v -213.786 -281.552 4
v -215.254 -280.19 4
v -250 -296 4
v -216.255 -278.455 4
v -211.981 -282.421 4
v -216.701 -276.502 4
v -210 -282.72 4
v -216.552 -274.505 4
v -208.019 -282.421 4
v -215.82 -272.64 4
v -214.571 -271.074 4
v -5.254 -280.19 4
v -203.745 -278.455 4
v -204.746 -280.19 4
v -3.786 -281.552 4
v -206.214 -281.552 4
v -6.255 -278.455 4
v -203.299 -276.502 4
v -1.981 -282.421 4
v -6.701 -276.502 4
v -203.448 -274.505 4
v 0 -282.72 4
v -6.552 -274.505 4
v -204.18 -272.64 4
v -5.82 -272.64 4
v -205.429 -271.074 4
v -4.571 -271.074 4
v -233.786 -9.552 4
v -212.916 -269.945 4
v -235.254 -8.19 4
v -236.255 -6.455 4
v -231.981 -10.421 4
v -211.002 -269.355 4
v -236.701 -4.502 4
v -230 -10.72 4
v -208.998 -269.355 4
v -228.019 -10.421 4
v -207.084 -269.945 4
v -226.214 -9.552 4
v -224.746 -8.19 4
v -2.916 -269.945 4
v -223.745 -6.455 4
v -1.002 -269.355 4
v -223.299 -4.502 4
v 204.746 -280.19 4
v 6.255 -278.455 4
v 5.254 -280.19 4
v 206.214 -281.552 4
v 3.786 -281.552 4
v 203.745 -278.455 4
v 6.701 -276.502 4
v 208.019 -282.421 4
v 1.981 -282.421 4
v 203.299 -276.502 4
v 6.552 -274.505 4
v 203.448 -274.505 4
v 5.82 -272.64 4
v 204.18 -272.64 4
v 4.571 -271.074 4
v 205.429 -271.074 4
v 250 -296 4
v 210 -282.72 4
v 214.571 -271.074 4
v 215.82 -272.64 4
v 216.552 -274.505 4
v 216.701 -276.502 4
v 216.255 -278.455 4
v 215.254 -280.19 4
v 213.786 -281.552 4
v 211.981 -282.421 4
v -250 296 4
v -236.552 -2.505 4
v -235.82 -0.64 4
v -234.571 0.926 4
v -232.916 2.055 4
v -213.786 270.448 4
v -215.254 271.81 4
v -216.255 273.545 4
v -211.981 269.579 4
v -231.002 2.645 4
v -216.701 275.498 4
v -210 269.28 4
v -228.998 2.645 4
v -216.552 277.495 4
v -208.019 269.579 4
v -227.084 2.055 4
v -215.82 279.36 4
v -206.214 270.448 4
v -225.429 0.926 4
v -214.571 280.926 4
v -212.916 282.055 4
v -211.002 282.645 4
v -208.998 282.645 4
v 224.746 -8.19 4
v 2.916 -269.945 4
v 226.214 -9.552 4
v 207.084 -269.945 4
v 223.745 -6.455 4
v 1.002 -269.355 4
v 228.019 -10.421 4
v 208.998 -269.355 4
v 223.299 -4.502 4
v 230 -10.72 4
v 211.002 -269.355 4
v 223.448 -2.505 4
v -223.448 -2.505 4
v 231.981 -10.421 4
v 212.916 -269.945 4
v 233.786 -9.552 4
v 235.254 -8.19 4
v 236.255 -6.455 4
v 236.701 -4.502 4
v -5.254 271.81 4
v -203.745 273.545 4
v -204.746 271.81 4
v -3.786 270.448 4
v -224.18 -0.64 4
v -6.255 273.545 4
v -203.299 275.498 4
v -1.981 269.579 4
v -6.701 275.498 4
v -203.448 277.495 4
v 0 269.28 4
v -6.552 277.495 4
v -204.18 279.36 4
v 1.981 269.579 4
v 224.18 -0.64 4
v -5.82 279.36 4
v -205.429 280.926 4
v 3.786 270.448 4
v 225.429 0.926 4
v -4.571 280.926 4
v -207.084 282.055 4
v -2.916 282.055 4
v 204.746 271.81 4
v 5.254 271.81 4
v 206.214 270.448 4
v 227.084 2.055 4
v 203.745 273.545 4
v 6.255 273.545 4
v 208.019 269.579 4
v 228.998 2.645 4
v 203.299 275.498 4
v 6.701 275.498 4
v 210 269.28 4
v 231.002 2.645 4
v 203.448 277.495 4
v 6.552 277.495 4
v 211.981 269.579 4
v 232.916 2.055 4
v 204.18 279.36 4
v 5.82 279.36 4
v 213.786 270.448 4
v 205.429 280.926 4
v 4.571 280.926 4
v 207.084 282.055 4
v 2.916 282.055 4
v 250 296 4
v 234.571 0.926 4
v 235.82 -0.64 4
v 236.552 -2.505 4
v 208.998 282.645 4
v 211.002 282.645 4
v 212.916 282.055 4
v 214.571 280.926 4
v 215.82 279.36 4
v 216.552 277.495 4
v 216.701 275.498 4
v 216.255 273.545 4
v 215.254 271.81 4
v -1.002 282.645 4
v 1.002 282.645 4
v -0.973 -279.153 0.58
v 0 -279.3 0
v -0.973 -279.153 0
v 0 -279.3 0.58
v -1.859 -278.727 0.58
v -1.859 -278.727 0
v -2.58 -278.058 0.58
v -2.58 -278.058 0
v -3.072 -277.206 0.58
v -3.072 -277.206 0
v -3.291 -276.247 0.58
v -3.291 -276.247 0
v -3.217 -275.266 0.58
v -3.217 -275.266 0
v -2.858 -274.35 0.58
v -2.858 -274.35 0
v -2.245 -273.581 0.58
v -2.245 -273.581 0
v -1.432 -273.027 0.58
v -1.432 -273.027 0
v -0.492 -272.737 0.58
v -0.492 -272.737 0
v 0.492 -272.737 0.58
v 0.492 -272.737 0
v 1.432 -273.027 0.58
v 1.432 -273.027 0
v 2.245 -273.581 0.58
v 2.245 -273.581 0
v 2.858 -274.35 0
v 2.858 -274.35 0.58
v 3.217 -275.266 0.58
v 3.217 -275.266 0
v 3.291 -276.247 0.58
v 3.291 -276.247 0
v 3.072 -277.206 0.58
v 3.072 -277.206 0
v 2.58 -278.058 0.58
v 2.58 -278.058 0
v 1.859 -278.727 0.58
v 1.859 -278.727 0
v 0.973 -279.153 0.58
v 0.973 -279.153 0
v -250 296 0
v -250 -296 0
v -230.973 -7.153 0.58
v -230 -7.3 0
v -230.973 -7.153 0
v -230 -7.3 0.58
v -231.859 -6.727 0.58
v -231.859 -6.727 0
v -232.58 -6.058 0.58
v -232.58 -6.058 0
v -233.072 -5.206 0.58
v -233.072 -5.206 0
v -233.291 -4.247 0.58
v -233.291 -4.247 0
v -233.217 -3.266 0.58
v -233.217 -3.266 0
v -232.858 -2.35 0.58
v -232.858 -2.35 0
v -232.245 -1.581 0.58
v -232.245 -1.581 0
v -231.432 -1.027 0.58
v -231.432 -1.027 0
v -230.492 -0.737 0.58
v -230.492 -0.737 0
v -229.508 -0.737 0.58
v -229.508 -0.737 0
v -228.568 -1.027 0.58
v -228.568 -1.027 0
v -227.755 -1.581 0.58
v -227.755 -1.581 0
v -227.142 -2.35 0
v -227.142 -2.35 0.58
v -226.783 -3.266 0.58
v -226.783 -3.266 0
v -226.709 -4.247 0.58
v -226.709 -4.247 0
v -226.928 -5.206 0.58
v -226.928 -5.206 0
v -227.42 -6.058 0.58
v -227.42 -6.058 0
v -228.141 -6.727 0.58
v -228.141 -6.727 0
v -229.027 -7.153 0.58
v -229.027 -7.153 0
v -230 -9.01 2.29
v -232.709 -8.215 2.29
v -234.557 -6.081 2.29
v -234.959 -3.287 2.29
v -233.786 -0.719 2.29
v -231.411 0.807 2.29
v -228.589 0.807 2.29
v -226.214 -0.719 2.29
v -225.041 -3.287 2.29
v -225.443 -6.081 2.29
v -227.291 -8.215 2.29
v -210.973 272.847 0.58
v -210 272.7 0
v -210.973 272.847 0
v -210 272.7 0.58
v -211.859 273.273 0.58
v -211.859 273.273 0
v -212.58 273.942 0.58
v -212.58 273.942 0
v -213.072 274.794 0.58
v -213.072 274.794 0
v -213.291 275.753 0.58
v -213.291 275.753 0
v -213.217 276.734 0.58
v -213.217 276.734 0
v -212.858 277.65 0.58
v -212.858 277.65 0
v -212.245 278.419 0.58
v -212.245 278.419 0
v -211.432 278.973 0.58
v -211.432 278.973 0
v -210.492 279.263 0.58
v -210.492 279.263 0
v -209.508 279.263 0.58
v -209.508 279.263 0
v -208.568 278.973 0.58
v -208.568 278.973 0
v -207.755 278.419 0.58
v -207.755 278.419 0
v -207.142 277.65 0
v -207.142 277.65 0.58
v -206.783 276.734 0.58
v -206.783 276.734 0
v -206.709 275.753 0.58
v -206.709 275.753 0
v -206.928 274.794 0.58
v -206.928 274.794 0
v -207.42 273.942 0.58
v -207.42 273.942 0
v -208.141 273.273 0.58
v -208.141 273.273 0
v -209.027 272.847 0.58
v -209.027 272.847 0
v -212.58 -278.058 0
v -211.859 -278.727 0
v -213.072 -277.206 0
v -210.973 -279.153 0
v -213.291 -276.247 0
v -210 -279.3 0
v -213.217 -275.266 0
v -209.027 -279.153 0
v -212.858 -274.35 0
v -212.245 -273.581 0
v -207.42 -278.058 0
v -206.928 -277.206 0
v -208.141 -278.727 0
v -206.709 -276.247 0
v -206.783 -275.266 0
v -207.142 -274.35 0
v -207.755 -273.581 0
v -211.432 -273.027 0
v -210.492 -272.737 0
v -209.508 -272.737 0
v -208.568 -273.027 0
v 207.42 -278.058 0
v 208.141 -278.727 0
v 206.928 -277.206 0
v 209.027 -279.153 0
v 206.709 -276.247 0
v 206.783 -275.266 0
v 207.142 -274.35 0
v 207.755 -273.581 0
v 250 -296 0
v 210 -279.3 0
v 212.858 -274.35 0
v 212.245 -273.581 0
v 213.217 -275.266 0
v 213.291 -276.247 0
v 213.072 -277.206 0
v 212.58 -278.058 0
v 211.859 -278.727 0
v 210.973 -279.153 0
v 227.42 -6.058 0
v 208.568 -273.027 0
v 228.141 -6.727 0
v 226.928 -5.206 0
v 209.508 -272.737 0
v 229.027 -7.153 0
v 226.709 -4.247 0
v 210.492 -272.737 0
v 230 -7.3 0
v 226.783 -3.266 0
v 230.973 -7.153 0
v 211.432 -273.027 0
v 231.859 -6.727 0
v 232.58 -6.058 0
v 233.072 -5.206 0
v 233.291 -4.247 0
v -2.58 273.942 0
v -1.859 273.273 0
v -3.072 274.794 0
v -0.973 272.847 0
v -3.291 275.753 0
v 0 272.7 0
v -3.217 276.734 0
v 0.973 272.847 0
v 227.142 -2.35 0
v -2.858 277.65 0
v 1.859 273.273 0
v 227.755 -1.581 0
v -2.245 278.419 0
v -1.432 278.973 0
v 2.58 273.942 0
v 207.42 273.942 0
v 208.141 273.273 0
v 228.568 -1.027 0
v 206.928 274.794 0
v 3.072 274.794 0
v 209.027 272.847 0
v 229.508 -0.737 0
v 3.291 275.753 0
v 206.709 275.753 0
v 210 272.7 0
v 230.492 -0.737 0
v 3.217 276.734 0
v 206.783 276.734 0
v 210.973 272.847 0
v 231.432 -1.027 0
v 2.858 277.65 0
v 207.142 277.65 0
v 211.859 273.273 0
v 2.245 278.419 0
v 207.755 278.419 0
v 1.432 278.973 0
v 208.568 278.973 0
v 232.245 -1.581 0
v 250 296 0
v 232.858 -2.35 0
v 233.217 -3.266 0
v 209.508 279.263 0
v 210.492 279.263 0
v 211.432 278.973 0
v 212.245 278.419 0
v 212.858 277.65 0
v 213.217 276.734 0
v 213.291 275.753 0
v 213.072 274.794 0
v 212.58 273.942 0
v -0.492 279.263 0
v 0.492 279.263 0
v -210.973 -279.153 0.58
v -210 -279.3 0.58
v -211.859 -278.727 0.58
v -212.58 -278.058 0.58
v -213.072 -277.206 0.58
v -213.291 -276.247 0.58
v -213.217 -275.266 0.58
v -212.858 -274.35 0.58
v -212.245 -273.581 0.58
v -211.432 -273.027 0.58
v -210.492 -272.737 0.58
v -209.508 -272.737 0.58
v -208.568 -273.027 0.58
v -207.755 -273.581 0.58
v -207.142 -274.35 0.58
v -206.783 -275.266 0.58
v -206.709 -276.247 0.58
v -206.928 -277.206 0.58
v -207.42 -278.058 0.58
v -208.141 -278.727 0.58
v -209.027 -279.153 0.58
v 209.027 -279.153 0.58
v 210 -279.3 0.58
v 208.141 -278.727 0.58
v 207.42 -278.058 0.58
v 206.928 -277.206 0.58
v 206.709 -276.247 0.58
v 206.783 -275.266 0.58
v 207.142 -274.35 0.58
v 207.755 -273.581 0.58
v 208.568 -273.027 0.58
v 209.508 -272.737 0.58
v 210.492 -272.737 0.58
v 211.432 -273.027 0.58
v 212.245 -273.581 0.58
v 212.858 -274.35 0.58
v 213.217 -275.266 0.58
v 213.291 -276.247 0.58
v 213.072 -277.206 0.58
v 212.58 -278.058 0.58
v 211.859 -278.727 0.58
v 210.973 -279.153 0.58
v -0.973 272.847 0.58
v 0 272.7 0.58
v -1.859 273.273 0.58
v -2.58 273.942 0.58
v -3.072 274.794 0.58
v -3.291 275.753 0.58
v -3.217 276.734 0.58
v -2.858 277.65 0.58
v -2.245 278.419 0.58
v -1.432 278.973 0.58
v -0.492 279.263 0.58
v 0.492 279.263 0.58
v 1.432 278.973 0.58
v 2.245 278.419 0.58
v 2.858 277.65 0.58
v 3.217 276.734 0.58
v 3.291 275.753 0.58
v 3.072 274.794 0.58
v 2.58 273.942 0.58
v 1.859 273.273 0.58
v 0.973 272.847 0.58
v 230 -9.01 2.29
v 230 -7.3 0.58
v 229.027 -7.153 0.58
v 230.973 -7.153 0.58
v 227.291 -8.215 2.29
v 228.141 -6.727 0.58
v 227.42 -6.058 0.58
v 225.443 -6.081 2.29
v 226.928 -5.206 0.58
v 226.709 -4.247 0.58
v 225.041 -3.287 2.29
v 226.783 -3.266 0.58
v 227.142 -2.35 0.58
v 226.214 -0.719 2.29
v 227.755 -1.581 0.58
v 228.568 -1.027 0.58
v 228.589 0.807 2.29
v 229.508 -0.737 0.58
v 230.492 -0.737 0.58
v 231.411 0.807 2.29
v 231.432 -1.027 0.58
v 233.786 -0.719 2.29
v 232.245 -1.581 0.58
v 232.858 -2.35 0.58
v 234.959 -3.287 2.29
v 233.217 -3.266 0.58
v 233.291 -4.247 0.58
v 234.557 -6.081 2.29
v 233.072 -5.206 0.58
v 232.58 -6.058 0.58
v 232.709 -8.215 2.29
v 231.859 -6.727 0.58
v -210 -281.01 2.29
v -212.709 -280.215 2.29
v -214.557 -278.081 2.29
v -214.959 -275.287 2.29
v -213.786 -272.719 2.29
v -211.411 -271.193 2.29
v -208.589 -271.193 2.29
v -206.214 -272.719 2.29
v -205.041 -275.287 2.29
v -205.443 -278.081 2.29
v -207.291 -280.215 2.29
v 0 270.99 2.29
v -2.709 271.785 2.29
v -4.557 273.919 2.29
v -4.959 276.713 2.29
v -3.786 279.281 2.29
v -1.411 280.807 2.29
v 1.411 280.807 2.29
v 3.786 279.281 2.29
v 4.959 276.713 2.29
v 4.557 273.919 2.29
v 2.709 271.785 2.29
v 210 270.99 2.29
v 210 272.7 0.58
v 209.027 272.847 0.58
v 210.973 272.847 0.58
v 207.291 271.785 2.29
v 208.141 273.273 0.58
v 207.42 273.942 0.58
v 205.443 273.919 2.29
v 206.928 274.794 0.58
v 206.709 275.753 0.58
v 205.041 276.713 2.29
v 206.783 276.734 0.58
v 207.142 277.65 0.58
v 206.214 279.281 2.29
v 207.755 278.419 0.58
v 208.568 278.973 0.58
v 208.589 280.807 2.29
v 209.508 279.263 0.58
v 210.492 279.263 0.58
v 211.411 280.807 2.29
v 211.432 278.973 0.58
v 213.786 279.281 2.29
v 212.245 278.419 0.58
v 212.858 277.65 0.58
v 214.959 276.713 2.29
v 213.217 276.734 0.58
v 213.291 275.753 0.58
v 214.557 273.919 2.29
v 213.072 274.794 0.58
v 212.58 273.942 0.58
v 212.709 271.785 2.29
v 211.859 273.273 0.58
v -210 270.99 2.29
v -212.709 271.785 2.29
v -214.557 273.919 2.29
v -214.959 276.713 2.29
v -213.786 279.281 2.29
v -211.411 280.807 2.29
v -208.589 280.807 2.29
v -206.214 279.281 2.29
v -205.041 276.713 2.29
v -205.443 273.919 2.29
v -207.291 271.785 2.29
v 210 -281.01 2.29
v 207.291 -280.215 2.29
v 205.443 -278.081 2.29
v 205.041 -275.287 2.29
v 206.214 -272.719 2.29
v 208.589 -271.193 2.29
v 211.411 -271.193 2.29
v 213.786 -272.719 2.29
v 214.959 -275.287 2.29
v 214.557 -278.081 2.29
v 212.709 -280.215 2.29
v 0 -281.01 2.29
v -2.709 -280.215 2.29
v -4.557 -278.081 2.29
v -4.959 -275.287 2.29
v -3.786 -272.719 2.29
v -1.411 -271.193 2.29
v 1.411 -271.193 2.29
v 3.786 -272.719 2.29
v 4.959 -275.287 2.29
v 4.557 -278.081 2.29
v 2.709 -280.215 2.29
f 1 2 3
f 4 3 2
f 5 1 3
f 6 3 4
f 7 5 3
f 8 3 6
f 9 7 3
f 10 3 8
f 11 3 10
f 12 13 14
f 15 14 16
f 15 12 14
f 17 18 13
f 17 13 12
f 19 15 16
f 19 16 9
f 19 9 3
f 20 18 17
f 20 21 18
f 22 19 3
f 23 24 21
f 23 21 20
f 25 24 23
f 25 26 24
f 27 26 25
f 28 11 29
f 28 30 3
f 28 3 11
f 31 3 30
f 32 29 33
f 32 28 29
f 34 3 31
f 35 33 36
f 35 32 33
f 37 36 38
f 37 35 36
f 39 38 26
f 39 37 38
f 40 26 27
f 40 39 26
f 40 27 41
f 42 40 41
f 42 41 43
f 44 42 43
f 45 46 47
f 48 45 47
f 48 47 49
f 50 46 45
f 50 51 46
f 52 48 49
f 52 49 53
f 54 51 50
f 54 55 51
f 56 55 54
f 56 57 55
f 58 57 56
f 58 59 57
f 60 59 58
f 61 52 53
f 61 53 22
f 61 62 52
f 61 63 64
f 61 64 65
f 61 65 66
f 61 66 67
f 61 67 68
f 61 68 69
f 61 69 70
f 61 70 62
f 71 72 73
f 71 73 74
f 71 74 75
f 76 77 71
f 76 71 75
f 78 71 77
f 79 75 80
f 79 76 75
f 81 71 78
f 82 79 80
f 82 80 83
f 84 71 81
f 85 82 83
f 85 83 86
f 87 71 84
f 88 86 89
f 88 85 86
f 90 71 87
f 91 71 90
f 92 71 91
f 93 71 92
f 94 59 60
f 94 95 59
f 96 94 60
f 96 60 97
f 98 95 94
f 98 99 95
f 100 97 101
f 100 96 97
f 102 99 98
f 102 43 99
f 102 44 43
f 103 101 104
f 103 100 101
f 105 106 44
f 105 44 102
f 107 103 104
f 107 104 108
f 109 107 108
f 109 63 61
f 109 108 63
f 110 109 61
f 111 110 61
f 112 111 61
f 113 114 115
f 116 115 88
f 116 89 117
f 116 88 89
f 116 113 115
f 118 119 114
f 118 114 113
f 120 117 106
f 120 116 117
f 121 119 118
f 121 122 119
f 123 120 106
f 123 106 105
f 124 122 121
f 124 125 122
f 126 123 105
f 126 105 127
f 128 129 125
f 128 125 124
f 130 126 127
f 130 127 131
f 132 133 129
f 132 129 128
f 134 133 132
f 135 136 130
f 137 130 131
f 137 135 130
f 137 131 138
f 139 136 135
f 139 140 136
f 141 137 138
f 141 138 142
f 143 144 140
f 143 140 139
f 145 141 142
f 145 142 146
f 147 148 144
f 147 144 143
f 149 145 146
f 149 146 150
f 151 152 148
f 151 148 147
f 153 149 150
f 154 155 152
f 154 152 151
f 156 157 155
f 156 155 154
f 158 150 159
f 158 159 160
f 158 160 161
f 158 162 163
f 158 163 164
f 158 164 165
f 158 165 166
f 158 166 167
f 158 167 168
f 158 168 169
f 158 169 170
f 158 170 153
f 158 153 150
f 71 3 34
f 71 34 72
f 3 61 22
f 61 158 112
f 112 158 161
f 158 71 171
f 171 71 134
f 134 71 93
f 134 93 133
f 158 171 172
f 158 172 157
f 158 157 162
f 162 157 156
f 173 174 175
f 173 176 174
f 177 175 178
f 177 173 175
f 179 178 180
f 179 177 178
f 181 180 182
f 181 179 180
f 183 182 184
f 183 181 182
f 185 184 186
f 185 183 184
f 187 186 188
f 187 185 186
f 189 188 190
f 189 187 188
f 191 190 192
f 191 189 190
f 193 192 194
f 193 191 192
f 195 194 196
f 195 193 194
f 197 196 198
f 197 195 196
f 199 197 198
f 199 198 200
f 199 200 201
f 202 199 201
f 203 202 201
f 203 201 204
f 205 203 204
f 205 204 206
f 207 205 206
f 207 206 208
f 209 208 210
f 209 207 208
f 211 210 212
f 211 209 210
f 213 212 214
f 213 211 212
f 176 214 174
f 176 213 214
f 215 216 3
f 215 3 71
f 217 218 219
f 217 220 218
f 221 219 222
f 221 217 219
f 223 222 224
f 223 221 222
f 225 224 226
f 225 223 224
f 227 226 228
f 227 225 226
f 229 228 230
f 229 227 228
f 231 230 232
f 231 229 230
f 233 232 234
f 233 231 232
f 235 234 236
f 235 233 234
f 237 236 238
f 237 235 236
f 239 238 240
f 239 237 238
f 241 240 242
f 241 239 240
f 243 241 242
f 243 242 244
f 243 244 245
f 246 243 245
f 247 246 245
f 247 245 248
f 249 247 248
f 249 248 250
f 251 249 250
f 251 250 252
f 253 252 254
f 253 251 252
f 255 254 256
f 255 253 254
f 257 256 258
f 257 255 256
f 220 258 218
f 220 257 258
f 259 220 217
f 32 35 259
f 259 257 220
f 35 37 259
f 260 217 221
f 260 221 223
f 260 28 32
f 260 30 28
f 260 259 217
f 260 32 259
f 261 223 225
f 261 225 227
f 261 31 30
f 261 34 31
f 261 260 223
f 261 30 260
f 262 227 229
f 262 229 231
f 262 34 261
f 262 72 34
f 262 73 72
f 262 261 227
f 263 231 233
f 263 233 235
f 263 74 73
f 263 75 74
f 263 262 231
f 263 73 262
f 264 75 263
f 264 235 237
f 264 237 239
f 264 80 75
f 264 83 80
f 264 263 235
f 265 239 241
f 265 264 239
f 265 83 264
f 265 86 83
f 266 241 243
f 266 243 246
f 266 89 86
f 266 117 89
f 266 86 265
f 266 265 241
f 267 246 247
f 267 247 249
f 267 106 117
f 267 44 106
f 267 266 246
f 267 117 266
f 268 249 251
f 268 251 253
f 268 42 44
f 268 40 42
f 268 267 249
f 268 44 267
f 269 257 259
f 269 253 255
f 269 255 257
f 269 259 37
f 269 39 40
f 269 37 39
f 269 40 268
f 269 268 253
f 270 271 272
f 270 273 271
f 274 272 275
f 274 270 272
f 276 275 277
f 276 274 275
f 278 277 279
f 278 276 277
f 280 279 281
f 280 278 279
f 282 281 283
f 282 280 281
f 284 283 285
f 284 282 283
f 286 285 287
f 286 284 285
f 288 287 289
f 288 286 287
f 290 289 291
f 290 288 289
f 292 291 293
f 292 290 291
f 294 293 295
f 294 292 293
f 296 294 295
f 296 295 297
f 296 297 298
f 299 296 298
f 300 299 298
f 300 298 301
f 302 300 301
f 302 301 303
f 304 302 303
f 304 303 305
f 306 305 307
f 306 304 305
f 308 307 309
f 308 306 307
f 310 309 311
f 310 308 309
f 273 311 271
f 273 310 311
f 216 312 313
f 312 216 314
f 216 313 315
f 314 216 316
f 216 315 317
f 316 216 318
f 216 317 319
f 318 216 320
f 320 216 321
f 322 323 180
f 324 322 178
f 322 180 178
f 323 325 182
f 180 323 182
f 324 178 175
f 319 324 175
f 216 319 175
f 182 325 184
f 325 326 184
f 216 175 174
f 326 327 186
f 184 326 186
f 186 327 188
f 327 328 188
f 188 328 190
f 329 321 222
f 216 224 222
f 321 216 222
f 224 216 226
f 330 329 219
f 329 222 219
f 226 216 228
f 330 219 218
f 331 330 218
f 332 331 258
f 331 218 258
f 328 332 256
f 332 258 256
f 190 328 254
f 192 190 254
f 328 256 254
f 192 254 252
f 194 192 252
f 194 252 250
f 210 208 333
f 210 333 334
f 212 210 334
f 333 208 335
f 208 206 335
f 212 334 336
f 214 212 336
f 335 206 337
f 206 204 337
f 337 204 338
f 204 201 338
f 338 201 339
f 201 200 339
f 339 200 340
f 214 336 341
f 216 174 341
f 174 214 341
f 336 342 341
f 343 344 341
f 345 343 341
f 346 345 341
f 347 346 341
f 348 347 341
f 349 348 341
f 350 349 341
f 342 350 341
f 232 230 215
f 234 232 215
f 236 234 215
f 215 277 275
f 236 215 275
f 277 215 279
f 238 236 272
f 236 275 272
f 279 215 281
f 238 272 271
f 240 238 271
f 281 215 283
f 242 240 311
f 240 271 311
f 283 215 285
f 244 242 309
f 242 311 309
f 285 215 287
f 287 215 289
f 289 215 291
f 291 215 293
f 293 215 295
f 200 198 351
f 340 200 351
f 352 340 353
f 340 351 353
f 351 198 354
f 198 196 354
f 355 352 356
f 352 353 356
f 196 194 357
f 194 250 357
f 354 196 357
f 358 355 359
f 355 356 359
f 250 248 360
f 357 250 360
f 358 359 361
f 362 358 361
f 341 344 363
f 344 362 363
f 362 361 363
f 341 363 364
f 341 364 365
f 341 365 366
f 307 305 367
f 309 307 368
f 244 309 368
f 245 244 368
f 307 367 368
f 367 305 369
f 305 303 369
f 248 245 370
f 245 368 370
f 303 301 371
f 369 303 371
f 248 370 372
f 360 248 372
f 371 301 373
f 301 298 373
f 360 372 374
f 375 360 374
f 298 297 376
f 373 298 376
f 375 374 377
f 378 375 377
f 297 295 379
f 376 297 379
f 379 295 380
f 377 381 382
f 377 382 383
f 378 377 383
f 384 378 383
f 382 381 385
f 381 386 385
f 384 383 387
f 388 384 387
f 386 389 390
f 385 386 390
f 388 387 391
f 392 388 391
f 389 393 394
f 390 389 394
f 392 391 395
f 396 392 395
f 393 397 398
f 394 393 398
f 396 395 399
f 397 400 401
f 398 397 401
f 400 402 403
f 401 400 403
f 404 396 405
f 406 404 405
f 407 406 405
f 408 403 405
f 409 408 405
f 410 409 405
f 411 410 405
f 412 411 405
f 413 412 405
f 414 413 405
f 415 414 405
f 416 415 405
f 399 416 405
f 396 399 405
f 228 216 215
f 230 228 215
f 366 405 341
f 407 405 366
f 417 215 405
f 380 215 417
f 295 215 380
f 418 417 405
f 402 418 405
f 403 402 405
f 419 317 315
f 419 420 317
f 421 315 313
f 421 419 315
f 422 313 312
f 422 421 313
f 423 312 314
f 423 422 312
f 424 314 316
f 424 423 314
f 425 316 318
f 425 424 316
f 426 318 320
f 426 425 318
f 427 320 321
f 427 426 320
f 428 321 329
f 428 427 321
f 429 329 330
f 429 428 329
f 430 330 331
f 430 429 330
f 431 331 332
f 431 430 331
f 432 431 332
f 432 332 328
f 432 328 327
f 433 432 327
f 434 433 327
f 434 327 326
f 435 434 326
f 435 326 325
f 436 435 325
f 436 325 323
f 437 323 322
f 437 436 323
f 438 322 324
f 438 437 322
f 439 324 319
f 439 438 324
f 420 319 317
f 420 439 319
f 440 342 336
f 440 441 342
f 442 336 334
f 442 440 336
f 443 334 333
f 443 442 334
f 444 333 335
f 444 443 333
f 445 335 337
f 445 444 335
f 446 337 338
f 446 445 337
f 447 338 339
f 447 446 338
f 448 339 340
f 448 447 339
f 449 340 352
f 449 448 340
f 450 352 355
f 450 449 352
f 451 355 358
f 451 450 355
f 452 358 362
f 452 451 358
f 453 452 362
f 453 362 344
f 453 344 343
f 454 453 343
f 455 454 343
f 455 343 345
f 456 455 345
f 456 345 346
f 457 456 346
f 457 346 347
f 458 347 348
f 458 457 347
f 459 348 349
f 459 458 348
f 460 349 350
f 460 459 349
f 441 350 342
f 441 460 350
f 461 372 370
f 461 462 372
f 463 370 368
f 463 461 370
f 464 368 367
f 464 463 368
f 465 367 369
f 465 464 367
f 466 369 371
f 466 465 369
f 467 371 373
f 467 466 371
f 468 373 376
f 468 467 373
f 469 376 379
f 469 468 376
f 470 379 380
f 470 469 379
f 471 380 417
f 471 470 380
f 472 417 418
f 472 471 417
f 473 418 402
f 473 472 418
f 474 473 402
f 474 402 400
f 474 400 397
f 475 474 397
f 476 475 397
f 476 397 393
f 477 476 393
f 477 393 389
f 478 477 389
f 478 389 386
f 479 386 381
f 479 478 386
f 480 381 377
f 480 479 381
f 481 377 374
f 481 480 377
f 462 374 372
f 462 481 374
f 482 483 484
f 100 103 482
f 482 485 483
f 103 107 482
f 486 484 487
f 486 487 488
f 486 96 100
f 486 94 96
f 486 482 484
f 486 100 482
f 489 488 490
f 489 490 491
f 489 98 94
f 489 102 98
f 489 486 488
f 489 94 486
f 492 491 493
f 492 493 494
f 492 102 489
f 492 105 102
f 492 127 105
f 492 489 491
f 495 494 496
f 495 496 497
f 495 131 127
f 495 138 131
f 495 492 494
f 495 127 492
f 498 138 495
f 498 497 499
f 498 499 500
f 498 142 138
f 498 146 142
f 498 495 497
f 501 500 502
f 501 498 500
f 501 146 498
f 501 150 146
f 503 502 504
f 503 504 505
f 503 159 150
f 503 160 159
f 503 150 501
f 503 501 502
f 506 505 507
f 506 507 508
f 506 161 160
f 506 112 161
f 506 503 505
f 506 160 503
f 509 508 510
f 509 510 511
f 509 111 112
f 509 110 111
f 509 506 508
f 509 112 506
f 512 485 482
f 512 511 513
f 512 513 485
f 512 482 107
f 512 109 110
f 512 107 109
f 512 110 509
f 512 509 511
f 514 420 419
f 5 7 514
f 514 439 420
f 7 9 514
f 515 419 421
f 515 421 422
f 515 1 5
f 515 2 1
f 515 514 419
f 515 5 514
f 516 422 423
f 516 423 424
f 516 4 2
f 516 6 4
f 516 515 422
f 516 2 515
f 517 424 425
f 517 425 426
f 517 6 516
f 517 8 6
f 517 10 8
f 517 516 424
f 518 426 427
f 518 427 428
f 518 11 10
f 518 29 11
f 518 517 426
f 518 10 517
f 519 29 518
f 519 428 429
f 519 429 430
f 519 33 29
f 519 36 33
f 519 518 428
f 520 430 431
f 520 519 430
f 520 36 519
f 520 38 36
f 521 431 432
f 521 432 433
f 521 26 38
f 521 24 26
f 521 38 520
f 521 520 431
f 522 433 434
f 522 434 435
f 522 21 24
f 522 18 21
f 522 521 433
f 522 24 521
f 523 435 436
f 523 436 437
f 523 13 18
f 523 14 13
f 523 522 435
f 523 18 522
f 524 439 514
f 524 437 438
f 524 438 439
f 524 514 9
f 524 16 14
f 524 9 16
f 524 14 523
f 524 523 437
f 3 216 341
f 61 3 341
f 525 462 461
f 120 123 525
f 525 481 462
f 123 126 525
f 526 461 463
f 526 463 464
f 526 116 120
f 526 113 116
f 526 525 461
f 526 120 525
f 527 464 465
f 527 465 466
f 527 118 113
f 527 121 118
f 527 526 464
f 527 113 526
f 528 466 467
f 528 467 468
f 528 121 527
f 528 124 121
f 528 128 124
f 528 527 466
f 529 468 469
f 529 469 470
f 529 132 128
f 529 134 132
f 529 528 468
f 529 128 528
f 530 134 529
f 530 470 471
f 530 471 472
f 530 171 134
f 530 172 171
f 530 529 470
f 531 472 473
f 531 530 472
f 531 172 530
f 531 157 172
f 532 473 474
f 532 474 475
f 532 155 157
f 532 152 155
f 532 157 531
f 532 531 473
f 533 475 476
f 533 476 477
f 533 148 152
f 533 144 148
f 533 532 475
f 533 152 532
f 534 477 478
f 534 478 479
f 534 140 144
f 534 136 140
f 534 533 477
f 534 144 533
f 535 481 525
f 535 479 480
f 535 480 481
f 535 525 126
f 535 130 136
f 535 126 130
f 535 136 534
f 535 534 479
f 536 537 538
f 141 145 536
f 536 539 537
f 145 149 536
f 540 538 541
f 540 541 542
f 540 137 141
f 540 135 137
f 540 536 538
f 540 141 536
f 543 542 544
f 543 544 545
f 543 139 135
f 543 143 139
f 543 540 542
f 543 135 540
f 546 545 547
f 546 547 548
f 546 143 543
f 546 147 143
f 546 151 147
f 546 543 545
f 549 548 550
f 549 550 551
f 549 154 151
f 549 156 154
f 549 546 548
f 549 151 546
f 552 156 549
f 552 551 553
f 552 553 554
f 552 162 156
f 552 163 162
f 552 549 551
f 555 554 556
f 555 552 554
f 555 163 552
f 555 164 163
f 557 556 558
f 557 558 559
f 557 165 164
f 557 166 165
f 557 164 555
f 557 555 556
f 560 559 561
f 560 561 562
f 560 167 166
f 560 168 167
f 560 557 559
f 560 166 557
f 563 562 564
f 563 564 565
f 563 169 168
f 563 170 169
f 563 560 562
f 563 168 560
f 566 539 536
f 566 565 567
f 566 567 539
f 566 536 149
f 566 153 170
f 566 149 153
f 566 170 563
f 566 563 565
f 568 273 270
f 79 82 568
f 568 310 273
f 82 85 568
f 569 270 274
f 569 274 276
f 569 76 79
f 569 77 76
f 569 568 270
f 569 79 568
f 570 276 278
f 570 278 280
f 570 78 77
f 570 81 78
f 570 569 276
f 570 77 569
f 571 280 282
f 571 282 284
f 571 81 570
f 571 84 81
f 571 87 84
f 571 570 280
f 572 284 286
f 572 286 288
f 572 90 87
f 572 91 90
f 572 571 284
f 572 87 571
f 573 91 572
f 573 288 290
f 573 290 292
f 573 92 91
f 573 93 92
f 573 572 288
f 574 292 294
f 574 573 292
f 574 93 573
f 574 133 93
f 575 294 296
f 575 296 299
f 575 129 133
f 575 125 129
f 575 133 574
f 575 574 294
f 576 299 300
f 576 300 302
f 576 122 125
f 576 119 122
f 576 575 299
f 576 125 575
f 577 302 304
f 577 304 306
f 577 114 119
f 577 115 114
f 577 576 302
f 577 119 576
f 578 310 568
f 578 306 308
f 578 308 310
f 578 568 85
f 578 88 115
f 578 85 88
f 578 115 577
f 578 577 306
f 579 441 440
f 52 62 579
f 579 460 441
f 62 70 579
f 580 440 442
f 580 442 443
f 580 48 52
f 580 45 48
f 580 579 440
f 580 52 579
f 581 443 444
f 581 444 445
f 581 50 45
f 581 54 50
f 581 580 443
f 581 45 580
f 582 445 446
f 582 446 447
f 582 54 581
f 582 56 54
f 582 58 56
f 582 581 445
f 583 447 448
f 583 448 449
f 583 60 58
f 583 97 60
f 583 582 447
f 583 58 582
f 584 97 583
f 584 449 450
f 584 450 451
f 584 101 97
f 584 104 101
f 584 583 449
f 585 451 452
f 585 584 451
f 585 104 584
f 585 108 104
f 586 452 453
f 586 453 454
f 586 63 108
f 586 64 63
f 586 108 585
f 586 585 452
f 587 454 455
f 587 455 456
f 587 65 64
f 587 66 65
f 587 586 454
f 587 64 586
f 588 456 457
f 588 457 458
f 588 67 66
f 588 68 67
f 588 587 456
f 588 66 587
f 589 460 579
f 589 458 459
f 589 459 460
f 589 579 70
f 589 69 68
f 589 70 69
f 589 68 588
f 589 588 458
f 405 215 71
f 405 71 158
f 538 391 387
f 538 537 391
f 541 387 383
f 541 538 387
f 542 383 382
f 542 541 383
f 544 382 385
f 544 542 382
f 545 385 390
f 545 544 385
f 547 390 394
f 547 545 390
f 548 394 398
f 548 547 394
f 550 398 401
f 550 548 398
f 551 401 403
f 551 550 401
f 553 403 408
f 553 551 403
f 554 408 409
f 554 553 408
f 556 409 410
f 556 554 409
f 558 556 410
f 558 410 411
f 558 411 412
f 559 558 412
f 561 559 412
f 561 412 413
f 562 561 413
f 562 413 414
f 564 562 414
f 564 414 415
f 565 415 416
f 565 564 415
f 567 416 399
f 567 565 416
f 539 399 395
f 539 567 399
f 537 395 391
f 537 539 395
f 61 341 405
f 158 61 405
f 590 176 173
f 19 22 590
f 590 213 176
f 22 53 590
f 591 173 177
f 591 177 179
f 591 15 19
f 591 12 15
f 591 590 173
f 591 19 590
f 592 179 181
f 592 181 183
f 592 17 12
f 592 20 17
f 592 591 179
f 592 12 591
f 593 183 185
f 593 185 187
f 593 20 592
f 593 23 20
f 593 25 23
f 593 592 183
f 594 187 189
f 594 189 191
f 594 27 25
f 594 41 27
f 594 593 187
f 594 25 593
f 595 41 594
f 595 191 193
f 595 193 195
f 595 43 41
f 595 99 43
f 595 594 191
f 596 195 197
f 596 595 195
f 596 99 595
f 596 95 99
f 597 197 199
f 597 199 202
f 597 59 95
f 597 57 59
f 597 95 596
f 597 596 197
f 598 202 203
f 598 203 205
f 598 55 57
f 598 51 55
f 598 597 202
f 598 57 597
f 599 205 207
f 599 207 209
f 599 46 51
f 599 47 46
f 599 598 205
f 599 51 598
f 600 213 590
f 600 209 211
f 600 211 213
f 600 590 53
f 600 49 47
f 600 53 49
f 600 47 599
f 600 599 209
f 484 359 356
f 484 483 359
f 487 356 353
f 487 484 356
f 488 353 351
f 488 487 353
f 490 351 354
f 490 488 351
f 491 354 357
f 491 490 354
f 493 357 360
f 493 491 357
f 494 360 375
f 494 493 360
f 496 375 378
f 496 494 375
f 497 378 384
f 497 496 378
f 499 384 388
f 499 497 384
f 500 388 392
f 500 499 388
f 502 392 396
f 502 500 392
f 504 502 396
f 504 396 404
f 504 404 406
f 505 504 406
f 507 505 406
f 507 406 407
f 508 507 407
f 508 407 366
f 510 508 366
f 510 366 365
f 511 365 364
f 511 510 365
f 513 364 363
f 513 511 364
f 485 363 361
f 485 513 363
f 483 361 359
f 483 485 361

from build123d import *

# Parameters (mm, degrees)
SKETCH1_W                                    = 500
SKETCH1_H                                    = 592
BOSS_EXTRUDE1_DEPTH                          = 4
CSK_FOR_M6_HEX_SOCKET_COUNTERSUNK_CA_2_COUNT = 2
CSK_FOR_M6_HEX_SOCKET_COUNTERSUNK_CA_2_PITCH = 460
CSK_FOR_M6_HEX_SOCKET_COUNTERSUNK_CA_3_COUNT = 2
CSK_FOR_M6_HEX_SOCKET_COUNTERSUNK_CA_3_PITCH = 272.73430294
CSK_FOR_M6_HEX_SOCKET_COUNTERSUNK_CA_4_COUNT = 2
CSK_FOR_M6_HEX_SOCKET_COUNTERSUNK_CA_4_PITCH = 356.207804519
CSK_FOR_M6_HEX_SOCKET_COUNTERSUNK_CA_5_COUNT = 2
CSK_FOR_M6_HEX_SOCKET_COUNTERSUNK_CA_5_PITCH = 517.28522113
CSK_FOR_M6_HEX_SOCKET_COUNTERSUNK_CA_6_COUNT = 2
CSK_FOR_M6_HEX_SOCKET_COUNTERSUNK_CA_6_PITCH = 521.536192416
CSK_FOR_M6_HEX_SOCKET_COUNTERSUNK_CA_7_COUNT = 2
CSK_FOR_M6_HEX_SOCKET_COUNTERSUNK_CA_7_PITCH = 362.35341864
CSK_FOR_M6_HEX_SOCKET_COUNTERSUNK_CA_8_COUNT = 2
CSK_FOR_M6_HEX_SOCKET_COUNTERSUNK_CA_8_PITCH = 280.713376952


with BuildPart() as part:
    # Sketch1 → Boss-Extrude1 (new body)
    with BuildSketch(Plane.XY):
        Rectangle(SKETCH1_W, SKETCH1_H)
    extrude(amount=BOSS_EXTRUDE1_DEPTH)

    # Sketch4 → CSK for M6 Hex Socket Countersunk Cap Screw1 (revolve, cut)
    with BuildSketch(Plane(origin=(-230, -4, 4), x_dir=(0, -1, 0), z_dir=(1, 0, 0))):
        Polygon((0, 0), (0, 4), (3.3, 4), (3.3, 3.42), (6.72, 0), align=None)
    csk_for_m6_hex_socket_countersunk_cap_sc = revolve(axis=Axis((-230, -4, 10.35), (0, 0, -1)), mode=Mode.SUBTRACT)

    # CSK for M6 Hex Socket Countersunk Ca 2: CSK for M6 Hex Socket Countersunk Cap Screw1 ×2
    with Locations(*[(i * CSK_FOR_M6_HEX_SOCKET_COUNTERSUNK_CA_2_PITCH, 0, 0) for i in range(1, CSK_FOR_M6_HEX_SOCKET_COUNTERSUNK_CA_2_COUNT)]):
        add(csk_for_m6_hex_socket_countersunk_cap_sc, mode=Mode.SUBTRACT)

    # CSK for M6 Hex Socket Countersunk Ca 3: CSK for M6 Hex Socket Countersunk Cap Screw1 ×2
    with Locations(*[Vector(0.07333144303605385, -0.9973076252903365, 0) * (i * CSK_FOR_M6_HEX_SOCKET_COUNTERSUNK_CA_3_PITCH) for i in range(1, CSK_FOR_M6_HEX_SOCKET_COUNTERSUNK_CA_3_COUNT)]):
        add(csk_for_m6_hex_socket_countersunk_cap_sc, mode=Mode.SUBTRACT)

    # CSK for M6 Hex Socket Countersunk Ca 4: CSK for M6 Hex Socket Countersunk Cap Screw1 ×2
    with Locations(*[Vector(0.6456905129038378, -0.7635992152601906, 0) * (i * CSK_FOR_M6_HEX_SOCKET_COUNTERSUNK_CA_4_PITCH) for i in range(1, CSK_FOR_M6_HEX_SOCKET_COUNTERSUNK_CA_4_COUNT)]):
        add(csk_for_m6_hex_socket_countersunk_cap_sc, mode=Mode.SUBTRACT)

    # CSK for M6 Hex Socket Countersunk Ca 5: CSK for M6 Hex Socket Countersunk Cap Screw1 ×2
    with Locations(*[Vector(0.8505945695460384, -0.525822097537551, 0) * (i * CSK_FOR_M6_HEX_SOCKET_COUNTERSUNK_CA_5_PITCH) for i in range(1, CSK_FOR_M6_HEX_SOCKET_COUNTERSUNK_CA_5_COUNT)]):
        add(csk_for_m6_hex_socket_countersunk_cap_sc, mode=Mode.SUBTRACT)

    # CSK for M6 Hex Socket Countersunk Ca 6: CSK for M6 Hex Socket Countersunk Cap Screw1 ×2
    with Locations(*[Vector(0.8436614877321075, 0.5368754921931593, 0) * (i * CSK_FOR_M6_HEX_SOCKET_COUNTERSUNK_CA_6_PITCH) for i in range(1, CSK_FOR_M6_HEX_SOCKET_COUNTERSUNK_CA_6_COUNT)]):
        add(csk_for_m6_hex_socket_countersunk_cap_sc, mode=Mode.SUBTRACT)

    # CSK for M6 Hex Socket Countersunk Ca 7: CSK for M6 Hex Socket Countersunk Cap Screw1 ×2
    with Locations(*[Vector(0.6347394233600139, 0.7727262545252344, 0) * (i * CSK_FOR_M6_HEX_SOCKET_COUNTERSUNK_CA_7_PITCH) for i in range(1, CSK_FOR_M6_HEX_SOCKET_COUNTERSUNK_CA_7_COUNT)]):
        add(csk_for_m6_hex_socket_countersunk_cap_sc, mode=Mode.SUBTRACT)

    # CSK for M6 Hex Socket Countersunk Ca 8: CSK for M6 Hex Socket Countersunk Cap Screw1 ×2
    with Locations(*[Vector(0.07124704998790936, 0.9974586998307351, 0) * (i * CSK_FOR_M6_HEX_SOCKET_COUNTERSUNK_CA_8_PITCH) for i in range(1, CSK_FOR_M6_HEX_SOCKET_COUNTERSUNK_CA_8_COUNT)]):
        add(csk_for_m6_hex_socket_countersunk_cap_sc, mode=Mode.SUBTRACT)


solid = part.part
